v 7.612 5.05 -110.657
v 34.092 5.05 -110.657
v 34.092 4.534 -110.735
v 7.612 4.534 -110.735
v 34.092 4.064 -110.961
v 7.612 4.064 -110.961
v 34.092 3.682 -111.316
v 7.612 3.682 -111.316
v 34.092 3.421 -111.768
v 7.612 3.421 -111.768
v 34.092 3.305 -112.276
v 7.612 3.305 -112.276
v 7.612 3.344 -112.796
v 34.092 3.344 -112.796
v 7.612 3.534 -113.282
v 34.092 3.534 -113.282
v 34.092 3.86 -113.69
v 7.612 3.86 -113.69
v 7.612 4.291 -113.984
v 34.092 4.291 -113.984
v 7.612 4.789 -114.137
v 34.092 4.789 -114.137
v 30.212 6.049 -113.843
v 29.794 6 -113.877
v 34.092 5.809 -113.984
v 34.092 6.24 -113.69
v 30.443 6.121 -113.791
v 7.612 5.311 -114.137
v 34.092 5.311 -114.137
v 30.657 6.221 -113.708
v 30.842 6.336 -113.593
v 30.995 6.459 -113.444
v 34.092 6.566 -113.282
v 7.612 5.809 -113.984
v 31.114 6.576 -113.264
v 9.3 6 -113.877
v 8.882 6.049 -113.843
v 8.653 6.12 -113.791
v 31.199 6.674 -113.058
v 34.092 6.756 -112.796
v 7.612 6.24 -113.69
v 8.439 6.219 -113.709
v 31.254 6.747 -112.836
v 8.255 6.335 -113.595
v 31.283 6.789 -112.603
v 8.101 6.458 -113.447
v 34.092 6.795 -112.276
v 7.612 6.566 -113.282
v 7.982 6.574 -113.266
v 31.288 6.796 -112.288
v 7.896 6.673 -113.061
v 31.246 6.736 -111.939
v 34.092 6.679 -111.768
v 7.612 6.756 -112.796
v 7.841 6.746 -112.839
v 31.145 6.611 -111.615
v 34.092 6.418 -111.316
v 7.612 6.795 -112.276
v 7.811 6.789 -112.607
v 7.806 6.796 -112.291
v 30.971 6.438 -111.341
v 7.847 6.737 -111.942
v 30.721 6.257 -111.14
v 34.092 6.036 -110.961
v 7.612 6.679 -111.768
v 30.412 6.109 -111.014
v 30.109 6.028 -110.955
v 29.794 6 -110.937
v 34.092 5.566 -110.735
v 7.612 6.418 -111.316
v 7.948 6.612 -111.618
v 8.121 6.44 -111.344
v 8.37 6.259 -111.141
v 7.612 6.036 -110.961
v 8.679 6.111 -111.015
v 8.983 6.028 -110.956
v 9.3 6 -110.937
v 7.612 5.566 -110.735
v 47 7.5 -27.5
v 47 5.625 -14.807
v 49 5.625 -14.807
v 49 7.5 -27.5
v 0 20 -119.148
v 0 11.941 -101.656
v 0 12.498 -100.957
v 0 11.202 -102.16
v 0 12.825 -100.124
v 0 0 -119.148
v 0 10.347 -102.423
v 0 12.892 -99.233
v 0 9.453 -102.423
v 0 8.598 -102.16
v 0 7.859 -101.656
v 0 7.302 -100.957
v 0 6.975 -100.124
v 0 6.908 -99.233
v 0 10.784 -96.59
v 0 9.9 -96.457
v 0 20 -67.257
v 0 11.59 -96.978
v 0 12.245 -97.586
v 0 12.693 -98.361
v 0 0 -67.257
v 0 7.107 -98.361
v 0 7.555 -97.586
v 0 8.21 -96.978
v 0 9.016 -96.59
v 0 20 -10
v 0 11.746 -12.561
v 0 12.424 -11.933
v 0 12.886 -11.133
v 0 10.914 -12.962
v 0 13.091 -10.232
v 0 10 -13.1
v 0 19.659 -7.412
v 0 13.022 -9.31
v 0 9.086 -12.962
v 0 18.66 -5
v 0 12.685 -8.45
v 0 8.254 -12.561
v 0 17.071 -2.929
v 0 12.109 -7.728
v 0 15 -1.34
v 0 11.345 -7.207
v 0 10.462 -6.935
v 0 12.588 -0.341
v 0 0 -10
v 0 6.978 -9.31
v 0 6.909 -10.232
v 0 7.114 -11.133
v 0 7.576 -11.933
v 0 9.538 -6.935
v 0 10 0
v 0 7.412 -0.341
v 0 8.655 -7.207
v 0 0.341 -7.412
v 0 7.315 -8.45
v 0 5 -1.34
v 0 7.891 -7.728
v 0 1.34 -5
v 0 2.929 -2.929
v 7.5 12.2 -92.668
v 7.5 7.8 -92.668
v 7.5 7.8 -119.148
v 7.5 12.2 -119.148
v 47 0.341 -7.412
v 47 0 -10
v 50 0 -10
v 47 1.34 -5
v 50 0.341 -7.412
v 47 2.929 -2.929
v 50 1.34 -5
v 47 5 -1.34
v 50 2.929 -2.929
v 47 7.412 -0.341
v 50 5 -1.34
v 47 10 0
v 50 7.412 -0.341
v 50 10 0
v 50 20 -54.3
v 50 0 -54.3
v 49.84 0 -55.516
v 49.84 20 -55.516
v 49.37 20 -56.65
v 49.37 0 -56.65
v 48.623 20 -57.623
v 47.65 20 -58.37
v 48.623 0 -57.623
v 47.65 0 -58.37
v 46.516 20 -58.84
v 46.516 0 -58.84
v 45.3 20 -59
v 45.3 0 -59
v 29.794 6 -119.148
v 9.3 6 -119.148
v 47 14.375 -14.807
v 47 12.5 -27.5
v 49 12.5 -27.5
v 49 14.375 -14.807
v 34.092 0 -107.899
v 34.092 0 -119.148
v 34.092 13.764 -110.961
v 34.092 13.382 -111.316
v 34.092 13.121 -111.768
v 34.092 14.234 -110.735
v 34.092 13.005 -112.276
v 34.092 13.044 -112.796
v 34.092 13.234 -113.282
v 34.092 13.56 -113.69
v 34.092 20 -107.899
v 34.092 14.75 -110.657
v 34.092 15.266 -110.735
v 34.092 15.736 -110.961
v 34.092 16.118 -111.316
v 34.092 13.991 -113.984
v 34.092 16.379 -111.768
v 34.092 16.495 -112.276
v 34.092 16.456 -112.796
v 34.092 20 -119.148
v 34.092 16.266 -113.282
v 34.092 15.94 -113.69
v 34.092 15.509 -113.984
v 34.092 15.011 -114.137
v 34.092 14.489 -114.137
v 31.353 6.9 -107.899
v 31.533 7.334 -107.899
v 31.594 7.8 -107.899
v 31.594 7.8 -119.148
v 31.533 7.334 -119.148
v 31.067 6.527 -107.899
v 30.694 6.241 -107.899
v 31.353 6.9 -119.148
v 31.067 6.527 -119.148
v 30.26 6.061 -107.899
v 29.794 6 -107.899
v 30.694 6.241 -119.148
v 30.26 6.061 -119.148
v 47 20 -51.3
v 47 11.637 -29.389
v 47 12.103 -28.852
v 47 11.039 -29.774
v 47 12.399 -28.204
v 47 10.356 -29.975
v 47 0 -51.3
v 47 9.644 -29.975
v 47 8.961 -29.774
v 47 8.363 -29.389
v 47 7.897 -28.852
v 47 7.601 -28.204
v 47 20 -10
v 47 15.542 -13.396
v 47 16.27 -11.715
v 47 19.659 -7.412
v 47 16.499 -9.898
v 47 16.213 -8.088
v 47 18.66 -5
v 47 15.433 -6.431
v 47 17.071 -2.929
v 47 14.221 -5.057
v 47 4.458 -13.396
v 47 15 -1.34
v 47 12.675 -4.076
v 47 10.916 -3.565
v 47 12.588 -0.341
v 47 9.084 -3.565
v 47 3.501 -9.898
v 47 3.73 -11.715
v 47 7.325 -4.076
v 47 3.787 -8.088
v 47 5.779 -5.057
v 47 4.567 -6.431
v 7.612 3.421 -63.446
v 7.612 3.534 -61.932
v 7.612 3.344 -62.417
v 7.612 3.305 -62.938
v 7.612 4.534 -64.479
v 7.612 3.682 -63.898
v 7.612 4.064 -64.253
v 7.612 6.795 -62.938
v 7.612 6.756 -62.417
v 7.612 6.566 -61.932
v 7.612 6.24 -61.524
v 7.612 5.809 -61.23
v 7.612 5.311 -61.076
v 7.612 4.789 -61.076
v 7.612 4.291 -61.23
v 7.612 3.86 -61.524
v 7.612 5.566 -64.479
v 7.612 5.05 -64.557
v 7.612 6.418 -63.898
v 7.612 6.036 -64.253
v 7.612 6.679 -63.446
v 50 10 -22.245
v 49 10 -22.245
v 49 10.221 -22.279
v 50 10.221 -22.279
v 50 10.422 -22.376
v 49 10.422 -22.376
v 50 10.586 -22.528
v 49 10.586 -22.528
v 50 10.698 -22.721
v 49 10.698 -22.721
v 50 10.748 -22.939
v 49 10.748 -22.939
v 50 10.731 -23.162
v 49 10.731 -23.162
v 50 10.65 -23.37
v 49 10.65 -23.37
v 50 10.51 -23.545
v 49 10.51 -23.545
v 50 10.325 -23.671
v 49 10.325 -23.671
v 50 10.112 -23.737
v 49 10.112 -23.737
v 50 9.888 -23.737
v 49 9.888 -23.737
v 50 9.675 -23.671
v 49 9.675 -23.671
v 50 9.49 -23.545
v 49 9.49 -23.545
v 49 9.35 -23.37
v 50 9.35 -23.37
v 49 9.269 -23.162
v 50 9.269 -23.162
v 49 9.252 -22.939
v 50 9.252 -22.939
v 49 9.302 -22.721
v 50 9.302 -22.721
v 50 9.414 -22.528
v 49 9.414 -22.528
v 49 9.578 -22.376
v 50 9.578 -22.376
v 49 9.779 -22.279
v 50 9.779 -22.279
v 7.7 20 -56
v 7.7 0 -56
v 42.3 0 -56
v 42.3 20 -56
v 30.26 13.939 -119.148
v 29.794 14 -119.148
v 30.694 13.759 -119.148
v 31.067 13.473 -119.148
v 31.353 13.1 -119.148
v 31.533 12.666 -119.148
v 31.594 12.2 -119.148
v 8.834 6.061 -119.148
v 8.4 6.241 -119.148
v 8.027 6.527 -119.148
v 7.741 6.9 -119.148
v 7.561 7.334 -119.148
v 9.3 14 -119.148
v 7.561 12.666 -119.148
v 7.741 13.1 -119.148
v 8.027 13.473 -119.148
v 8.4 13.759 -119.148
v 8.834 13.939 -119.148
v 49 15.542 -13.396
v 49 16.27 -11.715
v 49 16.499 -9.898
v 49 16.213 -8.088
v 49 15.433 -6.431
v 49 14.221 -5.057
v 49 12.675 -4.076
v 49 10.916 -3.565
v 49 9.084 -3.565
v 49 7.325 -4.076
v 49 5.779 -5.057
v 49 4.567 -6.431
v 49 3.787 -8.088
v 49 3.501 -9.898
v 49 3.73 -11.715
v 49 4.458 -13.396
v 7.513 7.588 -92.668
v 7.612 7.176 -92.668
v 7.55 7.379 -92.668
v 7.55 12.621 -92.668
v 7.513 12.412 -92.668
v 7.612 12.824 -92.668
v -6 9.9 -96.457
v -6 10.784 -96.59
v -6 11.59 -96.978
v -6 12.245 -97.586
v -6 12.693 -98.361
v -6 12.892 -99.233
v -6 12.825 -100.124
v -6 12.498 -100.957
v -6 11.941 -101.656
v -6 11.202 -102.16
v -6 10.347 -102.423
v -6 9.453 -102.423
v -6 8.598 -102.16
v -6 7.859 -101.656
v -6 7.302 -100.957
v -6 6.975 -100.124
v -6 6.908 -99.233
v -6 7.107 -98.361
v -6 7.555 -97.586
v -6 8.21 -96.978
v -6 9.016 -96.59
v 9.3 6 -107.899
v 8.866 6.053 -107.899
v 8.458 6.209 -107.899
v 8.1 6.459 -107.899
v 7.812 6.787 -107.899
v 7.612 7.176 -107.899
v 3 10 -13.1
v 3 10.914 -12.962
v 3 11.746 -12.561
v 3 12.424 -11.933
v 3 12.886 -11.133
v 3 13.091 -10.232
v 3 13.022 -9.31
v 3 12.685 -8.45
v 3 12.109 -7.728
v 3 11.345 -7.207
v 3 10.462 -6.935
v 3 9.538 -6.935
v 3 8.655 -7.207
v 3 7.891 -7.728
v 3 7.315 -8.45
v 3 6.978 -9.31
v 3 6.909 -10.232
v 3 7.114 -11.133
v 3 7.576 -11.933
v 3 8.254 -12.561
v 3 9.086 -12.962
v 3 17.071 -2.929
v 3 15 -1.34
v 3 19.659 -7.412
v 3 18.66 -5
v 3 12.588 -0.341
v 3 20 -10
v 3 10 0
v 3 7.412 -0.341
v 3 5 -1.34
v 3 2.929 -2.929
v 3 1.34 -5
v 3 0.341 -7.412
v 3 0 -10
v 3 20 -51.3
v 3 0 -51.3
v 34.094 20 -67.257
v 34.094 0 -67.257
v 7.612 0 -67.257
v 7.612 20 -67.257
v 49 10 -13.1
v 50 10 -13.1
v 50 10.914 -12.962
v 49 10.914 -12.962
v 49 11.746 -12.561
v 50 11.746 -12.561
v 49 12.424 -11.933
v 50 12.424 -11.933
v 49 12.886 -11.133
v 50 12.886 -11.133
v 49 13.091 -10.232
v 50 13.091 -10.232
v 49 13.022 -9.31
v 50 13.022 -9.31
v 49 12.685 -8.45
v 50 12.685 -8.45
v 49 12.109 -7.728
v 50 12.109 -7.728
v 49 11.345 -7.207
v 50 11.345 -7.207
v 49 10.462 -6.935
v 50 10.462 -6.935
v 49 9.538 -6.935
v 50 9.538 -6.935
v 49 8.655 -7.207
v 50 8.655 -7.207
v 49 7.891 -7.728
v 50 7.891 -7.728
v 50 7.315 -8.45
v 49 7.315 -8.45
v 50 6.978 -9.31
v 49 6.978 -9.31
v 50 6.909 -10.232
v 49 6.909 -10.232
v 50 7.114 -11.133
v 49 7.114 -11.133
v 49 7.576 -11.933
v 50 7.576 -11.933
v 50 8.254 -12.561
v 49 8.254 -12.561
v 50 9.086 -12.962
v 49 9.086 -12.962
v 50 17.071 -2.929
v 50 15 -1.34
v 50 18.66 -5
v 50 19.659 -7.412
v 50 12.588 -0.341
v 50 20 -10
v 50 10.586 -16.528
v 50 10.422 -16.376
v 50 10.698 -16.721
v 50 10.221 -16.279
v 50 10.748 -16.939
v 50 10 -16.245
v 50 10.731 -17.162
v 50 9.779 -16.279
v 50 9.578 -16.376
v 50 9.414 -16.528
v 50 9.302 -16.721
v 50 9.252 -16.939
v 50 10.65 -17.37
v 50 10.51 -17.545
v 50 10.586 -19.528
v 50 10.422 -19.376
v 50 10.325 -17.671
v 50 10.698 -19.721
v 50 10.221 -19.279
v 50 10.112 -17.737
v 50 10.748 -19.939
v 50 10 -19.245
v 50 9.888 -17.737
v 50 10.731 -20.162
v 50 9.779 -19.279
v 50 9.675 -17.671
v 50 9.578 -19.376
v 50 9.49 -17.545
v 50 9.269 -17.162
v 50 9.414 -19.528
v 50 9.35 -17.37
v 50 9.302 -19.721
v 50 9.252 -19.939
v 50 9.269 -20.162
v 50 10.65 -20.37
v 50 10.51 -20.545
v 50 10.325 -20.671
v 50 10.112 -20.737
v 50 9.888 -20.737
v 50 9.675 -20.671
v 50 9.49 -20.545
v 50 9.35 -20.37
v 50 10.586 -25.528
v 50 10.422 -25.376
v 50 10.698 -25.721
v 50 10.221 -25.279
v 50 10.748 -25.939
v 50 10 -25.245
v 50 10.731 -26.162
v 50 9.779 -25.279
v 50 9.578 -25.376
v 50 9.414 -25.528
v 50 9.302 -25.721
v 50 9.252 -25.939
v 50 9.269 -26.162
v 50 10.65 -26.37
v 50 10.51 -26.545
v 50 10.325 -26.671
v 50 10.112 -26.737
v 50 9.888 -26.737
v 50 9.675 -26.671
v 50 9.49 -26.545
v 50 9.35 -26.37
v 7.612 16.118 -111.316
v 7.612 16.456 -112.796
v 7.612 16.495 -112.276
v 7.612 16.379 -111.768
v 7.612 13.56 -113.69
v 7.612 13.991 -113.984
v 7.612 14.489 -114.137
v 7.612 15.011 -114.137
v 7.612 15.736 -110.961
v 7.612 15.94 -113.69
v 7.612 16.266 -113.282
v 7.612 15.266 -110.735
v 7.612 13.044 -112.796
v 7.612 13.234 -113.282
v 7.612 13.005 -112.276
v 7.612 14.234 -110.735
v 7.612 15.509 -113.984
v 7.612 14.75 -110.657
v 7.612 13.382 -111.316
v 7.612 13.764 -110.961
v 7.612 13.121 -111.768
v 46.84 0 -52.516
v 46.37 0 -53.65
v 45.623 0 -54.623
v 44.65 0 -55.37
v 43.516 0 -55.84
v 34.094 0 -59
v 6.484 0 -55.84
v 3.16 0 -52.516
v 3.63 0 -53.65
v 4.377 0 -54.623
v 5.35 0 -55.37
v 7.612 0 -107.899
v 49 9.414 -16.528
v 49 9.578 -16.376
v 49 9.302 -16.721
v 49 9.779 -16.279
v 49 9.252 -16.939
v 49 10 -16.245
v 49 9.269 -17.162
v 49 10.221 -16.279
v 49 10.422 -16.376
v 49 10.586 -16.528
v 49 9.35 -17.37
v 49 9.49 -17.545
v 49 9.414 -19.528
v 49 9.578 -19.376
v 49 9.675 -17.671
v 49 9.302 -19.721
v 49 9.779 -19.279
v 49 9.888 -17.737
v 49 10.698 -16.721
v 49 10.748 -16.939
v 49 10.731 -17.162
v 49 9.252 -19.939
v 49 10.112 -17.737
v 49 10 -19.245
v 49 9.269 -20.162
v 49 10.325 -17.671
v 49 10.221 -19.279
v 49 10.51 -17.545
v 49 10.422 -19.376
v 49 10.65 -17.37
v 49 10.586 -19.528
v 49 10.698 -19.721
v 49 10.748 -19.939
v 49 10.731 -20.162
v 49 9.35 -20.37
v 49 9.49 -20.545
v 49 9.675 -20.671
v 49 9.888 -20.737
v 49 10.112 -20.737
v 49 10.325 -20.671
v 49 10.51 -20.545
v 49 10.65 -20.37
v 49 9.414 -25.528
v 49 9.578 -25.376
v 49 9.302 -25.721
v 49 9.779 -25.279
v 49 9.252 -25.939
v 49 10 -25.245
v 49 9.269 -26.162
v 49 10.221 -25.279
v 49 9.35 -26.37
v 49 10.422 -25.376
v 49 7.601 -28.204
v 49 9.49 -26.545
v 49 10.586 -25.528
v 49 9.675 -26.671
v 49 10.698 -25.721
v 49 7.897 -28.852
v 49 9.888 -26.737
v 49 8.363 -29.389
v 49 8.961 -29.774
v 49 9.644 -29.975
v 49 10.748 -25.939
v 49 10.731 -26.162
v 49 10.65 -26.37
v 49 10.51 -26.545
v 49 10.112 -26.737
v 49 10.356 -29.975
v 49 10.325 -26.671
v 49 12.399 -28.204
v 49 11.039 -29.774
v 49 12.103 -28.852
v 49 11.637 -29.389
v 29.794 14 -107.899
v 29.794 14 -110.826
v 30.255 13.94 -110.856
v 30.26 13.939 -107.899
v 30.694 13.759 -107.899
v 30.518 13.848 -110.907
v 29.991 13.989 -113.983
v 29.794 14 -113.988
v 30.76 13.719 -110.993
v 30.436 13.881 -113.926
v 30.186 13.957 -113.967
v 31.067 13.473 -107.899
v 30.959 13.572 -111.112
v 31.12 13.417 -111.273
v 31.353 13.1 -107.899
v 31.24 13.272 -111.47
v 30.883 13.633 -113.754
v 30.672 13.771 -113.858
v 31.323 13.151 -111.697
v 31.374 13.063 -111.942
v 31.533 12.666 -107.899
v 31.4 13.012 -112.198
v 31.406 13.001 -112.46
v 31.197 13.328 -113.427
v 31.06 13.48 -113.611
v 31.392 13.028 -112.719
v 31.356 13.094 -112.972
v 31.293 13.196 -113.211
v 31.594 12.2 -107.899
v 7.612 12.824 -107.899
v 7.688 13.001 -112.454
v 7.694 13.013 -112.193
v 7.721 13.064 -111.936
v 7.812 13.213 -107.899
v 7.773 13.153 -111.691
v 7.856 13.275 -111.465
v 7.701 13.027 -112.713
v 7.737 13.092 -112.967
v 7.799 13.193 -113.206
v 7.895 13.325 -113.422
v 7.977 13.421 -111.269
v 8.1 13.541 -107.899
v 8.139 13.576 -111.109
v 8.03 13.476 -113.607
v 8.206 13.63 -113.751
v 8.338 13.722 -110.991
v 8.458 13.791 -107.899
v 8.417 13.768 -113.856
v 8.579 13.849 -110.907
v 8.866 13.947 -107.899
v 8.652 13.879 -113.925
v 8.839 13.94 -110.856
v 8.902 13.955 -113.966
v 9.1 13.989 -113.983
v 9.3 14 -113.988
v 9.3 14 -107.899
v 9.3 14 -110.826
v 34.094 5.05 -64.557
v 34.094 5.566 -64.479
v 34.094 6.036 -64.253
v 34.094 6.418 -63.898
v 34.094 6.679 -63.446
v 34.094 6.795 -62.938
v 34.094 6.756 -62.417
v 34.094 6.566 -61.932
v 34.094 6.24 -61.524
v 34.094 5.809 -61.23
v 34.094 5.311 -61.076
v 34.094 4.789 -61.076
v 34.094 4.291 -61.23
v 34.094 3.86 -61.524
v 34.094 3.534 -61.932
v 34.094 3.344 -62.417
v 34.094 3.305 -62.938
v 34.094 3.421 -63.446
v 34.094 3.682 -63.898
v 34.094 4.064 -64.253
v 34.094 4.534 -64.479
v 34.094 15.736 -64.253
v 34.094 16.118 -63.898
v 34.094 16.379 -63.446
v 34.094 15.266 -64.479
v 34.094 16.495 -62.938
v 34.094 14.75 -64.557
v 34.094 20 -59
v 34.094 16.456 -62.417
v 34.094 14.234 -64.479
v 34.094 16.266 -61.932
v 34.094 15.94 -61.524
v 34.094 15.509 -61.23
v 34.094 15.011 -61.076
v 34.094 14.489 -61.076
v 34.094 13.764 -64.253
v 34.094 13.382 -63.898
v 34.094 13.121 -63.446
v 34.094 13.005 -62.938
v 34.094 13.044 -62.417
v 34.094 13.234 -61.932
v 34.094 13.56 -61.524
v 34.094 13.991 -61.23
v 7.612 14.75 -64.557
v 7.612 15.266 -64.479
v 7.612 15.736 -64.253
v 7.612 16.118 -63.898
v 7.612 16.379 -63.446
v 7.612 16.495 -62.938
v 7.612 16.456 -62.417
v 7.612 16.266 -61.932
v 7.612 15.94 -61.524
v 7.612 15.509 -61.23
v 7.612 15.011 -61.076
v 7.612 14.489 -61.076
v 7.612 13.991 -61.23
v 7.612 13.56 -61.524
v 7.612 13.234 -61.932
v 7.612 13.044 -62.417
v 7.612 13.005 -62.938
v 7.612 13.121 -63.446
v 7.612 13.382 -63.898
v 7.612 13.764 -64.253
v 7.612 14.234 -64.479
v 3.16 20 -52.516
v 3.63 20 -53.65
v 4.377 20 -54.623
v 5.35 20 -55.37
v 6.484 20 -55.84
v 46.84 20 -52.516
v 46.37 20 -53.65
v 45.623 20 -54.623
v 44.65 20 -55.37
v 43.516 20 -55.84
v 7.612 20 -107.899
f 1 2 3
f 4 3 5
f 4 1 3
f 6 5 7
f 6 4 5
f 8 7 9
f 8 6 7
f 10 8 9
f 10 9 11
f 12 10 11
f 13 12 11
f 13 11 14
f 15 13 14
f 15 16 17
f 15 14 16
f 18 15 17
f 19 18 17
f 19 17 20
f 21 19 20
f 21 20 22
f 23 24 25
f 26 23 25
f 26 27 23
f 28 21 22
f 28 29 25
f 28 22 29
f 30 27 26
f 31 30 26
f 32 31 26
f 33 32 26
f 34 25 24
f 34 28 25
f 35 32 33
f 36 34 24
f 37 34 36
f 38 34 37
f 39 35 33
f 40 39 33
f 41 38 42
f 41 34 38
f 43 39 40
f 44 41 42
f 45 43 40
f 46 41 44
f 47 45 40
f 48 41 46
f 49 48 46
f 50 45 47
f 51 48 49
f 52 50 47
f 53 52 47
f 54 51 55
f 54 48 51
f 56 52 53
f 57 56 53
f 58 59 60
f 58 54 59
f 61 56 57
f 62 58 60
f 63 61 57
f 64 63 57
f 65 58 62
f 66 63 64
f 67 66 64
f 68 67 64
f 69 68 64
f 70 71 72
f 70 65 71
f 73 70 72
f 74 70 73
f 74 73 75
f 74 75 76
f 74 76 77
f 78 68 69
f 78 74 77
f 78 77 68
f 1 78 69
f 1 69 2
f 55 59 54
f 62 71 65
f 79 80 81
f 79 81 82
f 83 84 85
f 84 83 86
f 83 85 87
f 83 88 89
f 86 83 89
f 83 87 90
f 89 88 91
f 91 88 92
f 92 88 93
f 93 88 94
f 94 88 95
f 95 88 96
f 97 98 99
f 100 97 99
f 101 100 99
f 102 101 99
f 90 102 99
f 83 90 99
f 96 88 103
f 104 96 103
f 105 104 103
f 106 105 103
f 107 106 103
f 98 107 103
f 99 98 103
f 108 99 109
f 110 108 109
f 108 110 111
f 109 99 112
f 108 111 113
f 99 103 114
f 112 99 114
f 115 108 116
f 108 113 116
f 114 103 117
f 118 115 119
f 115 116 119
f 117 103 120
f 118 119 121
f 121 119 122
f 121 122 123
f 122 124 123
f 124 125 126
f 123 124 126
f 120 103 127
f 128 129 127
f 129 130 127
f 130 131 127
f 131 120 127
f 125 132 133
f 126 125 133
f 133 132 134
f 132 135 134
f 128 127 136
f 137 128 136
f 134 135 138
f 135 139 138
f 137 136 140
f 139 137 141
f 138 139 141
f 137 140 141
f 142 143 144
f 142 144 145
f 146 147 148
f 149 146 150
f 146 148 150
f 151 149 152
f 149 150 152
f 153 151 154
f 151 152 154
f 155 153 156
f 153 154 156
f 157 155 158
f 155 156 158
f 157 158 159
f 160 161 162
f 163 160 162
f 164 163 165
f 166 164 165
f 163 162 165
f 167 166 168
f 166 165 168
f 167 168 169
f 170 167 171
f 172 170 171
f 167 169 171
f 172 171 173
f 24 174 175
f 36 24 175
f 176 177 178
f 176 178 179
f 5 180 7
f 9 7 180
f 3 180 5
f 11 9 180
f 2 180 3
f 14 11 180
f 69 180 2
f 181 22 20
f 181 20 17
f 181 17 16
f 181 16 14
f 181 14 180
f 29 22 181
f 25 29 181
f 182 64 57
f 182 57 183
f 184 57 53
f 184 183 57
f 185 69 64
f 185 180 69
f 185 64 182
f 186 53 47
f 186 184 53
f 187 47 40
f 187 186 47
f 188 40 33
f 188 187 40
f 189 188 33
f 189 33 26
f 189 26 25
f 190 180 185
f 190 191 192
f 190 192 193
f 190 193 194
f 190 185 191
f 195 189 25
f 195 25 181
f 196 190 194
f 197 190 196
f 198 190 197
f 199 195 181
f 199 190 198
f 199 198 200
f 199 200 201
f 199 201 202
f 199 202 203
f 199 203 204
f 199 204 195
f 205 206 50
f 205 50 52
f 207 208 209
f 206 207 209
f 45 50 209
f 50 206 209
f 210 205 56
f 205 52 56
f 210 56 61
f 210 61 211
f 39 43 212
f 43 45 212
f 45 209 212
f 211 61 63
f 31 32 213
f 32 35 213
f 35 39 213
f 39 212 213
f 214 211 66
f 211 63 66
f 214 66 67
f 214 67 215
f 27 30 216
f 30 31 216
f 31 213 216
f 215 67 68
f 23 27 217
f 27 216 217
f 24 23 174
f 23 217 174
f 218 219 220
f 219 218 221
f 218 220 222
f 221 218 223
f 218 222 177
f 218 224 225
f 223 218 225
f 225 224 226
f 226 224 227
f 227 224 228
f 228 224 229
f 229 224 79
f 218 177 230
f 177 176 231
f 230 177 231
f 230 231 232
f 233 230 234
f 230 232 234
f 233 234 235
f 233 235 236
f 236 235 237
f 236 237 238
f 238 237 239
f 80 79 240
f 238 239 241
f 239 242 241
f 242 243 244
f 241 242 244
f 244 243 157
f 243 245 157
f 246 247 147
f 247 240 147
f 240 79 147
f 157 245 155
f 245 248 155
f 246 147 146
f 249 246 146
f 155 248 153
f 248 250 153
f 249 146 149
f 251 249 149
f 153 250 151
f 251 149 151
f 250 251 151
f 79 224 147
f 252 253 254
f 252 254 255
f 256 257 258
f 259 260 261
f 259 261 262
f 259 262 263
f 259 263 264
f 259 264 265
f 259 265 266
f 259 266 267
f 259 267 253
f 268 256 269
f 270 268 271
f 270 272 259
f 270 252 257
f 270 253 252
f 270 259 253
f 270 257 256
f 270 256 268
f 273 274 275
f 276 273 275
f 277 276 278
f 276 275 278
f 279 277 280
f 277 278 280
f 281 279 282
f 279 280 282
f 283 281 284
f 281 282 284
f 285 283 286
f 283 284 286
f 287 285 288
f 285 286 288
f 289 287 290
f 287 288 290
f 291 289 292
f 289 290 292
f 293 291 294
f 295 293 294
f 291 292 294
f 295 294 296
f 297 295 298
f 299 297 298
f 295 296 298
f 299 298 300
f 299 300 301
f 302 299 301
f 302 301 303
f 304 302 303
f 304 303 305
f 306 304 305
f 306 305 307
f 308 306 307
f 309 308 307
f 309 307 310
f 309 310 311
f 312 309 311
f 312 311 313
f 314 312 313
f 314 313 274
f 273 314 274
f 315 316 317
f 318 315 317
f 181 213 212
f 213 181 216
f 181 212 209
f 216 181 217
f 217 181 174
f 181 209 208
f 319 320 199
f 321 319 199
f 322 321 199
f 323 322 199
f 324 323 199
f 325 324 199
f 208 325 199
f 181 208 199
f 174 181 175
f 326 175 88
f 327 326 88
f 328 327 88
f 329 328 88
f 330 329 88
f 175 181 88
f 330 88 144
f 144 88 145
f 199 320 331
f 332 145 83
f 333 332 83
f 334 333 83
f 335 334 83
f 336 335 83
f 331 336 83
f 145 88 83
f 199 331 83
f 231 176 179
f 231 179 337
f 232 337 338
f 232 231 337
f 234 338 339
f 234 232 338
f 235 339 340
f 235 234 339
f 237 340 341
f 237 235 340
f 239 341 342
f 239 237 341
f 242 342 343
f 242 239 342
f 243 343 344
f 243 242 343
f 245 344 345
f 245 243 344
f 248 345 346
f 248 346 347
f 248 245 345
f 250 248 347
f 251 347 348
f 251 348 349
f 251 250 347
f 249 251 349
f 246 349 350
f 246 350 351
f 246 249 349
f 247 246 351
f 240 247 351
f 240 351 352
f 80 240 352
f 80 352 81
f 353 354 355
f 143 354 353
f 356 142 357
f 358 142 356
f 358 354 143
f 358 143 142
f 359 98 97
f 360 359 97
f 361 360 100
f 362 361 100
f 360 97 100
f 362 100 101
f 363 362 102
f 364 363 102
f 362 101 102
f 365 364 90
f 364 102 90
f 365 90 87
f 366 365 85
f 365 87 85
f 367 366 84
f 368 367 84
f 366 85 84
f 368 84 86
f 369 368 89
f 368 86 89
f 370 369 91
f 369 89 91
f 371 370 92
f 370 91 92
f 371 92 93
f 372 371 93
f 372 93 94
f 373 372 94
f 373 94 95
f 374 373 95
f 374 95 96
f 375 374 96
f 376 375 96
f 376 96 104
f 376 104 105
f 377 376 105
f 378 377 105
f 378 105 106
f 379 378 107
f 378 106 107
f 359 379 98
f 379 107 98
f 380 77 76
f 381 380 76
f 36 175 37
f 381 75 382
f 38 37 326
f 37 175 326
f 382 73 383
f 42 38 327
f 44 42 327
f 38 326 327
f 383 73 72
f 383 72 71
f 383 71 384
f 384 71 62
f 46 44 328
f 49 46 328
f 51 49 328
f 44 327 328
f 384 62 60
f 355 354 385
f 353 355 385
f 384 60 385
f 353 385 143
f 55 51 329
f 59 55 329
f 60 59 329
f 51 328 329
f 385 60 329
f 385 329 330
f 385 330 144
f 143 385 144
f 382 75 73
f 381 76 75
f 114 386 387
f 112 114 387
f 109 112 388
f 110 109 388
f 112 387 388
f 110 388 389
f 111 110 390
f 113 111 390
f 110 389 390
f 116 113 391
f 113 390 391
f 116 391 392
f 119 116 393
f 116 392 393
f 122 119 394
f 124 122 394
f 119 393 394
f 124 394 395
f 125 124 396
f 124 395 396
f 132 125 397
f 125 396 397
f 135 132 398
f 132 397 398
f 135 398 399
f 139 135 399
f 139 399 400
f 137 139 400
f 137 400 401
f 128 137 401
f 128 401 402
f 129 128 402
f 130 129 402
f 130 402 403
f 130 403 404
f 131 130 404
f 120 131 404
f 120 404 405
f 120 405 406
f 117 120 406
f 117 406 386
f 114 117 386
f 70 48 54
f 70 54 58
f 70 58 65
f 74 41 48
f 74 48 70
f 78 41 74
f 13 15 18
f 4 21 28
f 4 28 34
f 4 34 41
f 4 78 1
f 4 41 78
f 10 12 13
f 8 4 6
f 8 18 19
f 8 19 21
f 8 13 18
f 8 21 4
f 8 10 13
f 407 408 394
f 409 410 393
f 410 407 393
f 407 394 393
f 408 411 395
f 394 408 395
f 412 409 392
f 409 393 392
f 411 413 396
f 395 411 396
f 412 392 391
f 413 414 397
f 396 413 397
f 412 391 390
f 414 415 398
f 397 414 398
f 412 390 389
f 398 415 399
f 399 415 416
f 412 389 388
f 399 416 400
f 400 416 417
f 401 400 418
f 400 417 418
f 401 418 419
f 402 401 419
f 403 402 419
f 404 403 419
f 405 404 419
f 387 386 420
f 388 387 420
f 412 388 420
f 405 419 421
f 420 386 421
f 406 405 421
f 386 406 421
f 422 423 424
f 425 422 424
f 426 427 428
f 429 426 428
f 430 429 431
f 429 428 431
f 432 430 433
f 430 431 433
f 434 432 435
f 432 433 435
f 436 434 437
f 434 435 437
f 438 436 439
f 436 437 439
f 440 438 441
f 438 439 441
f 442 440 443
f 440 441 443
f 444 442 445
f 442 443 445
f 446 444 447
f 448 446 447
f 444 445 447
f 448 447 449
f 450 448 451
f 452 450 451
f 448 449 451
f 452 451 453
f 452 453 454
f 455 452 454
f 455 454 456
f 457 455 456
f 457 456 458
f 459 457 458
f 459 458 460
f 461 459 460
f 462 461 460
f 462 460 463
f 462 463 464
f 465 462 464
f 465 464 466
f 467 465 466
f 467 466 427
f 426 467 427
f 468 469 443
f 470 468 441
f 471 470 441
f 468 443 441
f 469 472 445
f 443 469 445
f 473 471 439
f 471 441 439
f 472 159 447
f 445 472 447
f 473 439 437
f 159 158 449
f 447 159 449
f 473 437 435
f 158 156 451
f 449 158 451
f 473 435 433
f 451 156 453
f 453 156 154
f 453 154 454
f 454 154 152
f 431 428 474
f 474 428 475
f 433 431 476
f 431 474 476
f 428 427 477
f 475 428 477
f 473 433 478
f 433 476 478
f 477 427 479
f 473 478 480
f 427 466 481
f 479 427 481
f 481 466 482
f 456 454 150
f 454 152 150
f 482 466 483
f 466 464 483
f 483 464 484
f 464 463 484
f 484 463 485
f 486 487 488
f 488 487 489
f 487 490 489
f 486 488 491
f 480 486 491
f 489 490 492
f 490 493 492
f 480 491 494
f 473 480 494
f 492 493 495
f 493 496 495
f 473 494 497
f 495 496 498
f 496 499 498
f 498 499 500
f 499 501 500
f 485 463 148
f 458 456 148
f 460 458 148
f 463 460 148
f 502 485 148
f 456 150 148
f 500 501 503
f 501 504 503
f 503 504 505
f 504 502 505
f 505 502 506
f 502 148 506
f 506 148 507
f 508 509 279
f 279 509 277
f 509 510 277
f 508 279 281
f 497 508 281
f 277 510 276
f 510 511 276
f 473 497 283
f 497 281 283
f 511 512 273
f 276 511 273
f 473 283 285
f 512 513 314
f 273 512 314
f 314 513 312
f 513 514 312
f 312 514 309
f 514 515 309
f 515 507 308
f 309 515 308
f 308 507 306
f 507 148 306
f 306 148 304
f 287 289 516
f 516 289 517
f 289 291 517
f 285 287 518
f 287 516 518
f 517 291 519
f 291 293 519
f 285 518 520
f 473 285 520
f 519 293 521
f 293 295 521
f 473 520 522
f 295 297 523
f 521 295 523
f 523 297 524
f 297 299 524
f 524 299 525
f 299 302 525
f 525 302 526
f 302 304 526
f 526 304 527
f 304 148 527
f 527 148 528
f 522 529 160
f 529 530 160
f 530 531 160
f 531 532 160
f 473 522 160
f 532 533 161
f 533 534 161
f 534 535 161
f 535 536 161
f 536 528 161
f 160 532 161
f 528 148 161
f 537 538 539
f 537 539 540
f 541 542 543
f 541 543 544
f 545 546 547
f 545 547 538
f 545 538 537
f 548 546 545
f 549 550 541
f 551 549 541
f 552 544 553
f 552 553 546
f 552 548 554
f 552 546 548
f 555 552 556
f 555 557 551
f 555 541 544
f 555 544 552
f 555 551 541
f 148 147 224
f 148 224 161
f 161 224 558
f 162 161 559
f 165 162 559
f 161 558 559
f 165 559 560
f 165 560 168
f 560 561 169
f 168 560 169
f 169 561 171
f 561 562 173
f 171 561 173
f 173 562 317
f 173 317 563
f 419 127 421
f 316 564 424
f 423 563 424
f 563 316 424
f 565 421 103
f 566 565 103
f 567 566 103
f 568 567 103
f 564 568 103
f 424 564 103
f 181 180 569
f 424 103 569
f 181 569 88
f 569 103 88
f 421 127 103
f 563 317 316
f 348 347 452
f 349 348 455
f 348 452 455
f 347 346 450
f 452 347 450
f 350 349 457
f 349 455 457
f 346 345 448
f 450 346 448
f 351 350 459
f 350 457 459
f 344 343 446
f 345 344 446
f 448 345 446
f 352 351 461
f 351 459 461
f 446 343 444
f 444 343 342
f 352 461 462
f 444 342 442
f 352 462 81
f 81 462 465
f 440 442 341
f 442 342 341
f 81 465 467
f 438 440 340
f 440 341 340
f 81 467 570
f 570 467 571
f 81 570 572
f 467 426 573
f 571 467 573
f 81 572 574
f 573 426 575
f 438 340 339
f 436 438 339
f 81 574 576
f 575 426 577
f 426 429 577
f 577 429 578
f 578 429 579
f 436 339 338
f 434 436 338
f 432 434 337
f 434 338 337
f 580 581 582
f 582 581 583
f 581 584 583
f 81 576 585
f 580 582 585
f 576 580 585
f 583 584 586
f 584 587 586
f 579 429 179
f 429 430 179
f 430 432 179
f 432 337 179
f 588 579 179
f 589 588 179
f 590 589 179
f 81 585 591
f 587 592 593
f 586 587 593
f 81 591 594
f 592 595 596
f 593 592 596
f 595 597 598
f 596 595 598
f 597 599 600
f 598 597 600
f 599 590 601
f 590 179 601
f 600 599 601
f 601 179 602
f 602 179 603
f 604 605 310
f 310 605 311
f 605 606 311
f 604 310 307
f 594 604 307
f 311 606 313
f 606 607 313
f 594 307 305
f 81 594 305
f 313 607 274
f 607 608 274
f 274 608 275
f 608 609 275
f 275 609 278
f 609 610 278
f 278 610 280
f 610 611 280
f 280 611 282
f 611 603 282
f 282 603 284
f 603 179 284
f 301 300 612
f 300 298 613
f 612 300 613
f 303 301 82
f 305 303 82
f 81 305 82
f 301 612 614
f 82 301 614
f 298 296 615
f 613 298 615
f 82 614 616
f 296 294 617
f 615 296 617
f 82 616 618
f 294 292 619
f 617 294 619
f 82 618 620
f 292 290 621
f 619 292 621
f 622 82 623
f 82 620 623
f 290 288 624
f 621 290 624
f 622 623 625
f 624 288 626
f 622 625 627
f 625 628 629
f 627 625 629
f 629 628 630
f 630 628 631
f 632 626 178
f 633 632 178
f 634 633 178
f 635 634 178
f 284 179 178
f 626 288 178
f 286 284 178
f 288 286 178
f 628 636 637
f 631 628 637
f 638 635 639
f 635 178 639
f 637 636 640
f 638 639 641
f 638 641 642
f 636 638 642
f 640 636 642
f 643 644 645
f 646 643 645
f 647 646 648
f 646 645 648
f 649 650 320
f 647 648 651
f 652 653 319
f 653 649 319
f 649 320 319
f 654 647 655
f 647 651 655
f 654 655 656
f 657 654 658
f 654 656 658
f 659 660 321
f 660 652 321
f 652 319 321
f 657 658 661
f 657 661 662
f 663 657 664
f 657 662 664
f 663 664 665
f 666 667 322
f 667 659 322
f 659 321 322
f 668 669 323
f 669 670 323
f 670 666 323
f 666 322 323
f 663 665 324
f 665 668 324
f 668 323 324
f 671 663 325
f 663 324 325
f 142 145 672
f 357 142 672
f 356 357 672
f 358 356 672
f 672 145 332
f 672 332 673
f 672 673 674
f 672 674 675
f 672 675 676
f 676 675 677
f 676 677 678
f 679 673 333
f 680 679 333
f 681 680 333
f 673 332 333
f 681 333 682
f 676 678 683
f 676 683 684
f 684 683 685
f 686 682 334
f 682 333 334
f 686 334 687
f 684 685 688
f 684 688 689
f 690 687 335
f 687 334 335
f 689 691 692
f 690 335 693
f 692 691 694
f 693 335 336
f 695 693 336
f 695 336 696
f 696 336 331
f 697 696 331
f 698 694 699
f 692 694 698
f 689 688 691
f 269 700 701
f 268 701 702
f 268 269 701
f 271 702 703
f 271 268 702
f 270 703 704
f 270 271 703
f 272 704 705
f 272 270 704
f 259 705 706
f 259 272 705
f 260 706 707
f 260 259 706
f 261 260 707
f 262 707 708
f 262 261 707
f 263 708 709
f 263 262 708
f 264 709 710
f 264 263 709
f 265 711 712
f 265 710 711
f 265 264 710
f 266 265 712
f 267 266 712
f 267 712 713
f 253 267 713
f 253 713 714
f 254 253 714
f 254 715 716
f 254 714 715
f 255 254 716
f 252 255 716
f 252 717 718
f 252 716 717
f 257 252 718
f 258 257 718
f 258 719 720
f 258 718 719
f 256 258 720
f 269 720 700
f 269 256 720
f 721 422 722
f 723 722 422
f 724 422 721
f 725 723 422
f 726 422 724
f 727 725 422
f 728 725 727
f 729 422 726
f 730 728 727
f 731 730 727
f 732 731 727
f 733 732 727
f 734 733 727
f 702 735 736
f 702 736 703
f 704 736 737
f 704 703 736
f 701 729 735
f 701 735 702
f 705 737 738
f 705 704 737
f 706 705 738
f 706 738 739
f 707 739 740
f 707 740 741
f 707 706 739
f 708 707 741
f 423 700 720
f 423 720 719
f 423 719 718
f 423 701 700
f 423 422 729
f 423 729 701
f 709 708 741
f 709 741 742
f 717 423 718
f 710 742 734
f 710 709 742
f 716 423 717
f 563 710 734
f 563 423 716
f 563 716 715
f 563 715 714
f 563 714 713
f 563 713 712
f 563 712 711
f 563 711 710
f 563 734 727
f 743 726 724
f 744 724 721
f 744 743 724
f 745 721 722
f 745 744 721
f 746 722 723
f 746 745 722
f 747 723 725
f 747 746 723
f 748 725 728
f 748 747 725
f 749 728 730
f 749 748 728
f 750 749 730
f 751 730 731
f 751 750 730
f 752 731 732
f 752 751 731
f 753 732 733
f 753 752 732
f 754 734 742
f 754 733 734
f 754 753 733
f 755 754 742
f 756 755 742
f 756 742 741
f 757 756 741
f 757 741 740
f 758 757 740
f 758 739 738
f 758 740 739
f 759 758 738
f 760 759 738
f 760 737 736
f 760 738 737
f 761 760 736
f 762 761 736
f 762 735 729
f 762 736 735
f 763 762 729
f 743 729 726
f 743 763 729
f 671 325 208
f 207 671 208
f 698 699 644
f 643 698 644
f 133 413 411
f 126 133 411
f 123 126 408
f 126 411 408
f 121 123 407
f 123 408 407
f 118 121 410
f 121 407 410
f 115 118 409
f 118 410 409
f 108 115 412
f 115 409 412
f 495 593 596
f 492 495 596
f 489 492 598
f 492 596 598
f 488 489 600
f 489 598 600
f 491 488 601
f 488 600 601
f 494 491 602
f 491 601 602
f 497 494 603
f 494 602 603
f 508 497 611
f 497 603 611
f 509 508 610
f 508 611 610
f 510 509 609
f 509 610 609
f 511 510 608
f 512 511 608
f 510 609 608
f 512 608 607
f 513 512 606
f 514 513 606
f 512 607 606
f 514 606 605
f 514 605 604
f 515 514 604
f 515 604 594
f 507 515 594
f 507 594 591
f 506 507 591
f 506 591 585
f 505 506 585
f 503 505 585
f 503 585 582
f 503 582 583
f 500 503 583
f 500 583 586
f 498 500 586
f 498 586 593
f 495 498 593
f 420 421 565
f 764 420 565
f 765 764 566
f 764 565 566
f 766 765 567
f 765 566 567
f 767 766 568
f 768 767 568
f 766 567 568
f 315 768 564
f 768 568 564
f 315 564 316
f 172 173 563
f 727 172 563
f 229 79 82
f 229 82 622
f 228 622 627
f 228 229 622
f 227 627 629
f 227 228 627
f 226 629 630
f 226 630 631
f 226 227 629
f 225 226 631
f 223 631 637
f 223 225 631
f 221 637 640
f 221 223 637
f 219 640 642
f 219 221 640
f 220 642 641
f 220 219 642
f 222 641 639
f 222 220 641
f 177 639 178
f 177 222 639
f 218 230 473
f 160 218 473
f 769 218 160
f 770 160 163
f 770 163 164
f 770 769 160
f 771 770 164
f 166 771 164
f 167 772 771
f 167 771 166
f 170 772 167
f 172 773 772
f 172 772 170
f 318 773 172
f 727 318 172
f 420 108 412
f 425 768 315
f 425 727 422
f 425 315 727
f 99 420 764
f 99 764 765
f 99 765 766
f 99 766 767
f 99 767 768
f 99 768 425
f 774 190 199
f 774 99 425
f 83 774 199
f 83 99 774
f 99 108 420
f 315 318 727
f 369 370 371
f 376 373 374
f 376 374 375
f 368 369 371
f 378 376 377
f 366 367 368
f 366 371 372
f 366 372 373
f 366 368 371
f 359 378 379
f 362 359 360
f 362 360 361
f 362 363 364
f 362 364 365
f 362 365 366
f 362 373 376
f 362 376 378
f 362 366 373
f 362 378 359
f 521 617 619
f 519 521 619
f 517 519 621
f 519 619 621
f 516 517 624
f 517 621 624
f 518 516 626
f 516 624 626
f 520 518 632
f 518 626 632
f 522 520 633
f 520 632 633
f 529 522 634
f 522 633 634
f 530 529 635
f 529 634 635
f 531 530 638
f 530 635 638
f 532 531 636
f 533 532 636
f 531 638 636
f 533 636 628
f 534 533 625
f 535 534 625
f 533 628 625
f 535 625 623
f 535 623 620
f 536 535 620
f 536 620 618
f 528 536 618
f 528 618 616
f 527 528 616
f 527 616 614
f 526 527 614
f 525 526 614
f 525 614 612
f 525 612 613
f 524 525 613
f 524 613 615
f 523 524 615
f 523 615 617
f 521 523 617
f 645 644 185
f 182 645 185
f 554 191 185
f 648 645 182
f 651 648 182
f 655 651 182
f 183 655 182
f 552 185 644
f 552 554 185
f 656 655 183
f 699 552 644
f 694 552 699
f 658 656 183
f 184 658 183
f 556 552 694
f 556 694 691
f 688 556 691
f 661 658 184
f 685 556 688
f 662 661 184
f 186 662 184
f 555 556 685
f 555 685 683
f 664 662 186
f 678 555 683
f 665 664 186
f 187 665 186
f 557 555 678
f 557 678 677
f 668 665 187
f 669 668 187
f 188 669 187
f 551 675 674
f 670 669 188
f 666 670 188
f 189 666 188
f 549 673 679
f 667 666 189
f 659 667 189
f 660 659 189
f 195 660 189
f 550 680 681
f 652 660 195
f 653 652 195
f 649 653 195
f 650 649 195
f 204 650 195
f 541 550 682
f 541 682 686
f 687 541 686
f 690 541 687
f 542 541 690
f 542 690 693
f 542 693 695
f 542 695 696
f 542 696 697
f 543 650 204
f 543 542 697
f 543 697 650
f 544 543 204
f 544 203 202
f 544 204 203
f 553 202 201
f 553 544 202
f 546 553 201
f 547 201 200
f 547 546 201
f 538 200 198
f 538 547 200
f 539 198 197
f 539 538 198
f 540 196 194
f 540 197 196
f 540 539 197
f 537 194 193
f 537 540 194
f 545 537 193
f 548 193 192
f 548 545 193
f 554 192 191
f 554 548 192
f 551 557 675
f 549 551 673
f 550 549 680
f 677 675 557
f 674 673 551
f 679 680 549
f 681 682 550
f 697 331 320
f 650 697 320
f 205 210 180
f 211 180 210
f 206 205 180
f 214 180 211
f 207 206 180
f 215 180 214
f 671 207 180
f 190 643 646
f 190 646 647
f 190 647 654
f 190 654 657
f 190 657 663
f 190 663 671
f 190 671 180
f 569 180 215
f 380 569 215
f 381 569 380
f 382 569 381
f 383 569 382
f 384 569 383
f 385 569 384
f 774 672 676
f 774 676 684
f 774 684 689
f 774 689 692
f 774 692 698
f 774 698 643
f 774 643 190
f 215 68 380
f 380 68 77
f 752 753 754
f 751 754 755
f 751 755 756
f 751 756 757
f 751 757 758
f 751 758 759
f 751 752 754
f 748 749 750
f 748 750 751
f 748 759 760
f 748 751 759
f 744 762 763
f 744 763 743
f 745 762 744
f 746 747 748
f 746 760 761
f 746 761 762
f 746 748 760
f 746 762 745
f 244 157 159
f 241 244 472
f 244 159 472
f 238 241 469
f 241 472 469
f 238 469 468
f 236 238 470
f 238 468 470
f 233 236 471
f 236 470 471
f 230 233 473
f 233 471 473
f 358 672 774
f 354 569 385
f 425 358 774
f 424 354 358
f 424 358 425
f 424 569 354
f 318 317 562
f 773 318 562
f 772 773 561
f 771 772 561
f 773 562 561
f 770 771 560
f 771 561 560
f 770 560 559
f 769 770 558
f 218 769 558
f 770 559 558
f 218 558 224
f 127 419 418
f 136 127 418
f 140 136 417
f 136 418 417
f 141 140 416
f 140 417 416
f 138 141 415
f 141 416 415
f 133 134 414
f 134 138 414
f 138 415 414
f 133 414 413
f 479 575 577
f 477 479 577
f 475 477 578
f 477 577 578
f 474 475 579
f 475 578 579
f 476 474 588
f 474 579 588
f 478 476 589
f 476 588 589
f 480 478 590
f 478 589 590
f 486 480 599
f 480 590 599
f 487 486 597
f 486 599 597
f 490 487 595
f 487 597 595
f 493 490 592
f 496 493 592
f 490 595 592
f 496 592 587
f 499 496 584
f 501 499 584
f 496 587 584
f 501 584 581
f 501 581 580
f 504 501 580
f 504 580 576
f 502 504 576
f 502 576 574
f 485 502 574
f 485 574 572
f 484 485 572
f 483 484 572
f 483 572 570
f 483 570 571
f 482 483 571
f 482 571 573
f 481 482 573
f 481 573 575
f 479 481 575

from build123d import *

# Parameters (mm, degrees)
AUFSATZ_LINEAR_AUSTRAGEN1_DEPTH      = 20
SCHNITT_LINEAR_AUSTRAGEN1_DEPTH      = 53.24
SKIZZE3_R                            = 3.1
SCHNITT_LINEAR_AUSTRAGEN2_DEPTH      = 53.24
SCHNITT_LINEAR_AUSTRAGEN3_DEPTH      = 2
SKIZZE5_R                            = 0.75
SCHNITT_LINEAR_AUSTRAGEN4_DEPTH      = 2
AUFSATZ_LINEAR_AUSTRAGEN2_DEPTH      = 20
SKIZZE7_W                            = 7.611739691
SKIZZE7_H                            = 51.890970688
AUFSATZ_LINEAR_AUSTRAGEN3_DEPTH      = 20
SKIZZE8_W                            = 11.248625368
SKIZZE8_H                            = 20
AUFSATZ_LINEAR_AUSTRAGEN4_DEPTH      = 26.48
SCHNITT_LINEAR_AUSTRAGEN5_DEPTH      = 26.48
SCHNITT_LINEAR_AUSTRAGEN6_DEPTH      = 6
SCHNITT_LINEAR_AUSTRAGEN6_DEPTH_BACK = 26.48
SKIZZE10_R                           = 1.75
SKIZZE11_R                           = 3
AUFSATZ_LINEAR_AUSTRAGEN5_DEPTH      = 6


with BuildPart() as part:
    # Skizze1 → Aufsatz-Linear austragen1 (new body)
    with BuildSketch(Plane(origin=(0, 0, 0), x_dir=(1, 0, 0), z_dir=(0, 1, 0))):
        with BuildLine():
            Line((0, 59), (0, 0))
            Line((0, 0), (3, 0))
            Line((3, 0), (3, 51.3))
            ThreePointArc((3, 51.3), (4.376598128, 54.623401872), (7.7, 56))
            Line((7.7, 56), (42.3, 56))
            ThreePointArc((42.3, 56), (45.623401872, 54.623401872), (47, 51.3))
            Line((47, 51.3), (47, 0))
            Line((47, 0), (50, 0))
            Line((50, 0), (50, 54.3))
            ThreePointArc((50, 54.3), (48.623401872, 57.623401872), (45.3, 59))
            Line((45.3, 59), (0, 59))
        make_face()
    extrude(amount=AUFSATZ_LINEAR_AUSTRAGEN1_DEPTH)

    # Skizze2 → Schnitt-Linear austragen1 (cut)
    with BuildSketch(Plane(origin=(50, 0, 0), x_dir=(0, 0, -1), z_dir=(1, 0, 0))):
        with BuildLine():
            ThreePointArc((0, 10), (2.928932188, 17.071067812), (10, 20))
            Line((10, 20), (0, 20))
            Line((0, 20), (0, 10))
        make_face()
        with BuildLine():
            ThreePointArc((10, 0), (2.928932188, 2.928932188), (0, 10))
            Line((0, 10), (0, 0))
            Line((0, 0), (10, 0))
        make_face()
    extrude(amount=-SCHNITT_LINEAR_AUSTRAGEN1_DEPTH, mode=Mode.SUBTRACT)

    # Skizze3 → Schnitt-Linear austragen2 (cut)
    with BuildSketch(Plane(origin=(50, 0, 0), x_dir=(0, 0, -1), z_dir=(1, 0, 0))):
        with Locations((10, 10)):
            Circle(SKIZZE3_R)
    extrude(amount=-SCHNITT_LINEAR_AUSTRAGEN2_DEPTH, mode=Mode.SUBTRACT)

    # Skizze4 → Schnitt-Linear austragen3 (cut)
    with BuildSketch(Plane.ZY.offset(-47)):
        with BuildLine():
            Line((-27.5, 12.5), (-14.807252725, 14.374965285))
            ThreePointArc((-14.807252725, 14.374965285), (-3.5, 10), (-14.807252725, 5.625034715))
            Line((-14.807252725, 5.625034715), (-27.5, 7.5))
            ThreePointArc((-27.5, 7.5), (-30, 10), (-27.5, 12.5))
        make_face()
    extrude(amount=-SCHNITT_LINEAR_AUSTRAGEN3_DEPTH, mode=Mode.SUBTRACT)

    # Skizze5 → Schnitt-Linear austragen4 (cut)
    with BuildSketch(Plane.ZY.offset(-49)):
        with Locations((-25.995480757, 10)):
            Circle(SKIZZE5_R)
        with Locations((-22.995480757, 10)):
            Circle(SKIZZE5_R)
        with Locations((-19.995480757, 10)):
            Circle(SKIZZE5_R)
        with Locations((-16.995480757, 10)):
            Circle(SKIZZE5_R)
    extrude(amount=-SCHNITT_LINEAR_AUSTRAGEN4_DEPTH, mode=Mode.SUBTRACT)

    # Skizze6 → Aufsatz-Linear austragen2 (add)
    with BuildSketch(Plane.XZ):
        Polygon((34.094038703, -59.256850744), (34.094038703, -67.256850744), (0, -67.256850744), (0, -59.256850744), (0, -57.894447073), (34.094038703, -57.894447073), align=None)
    extrude(amount=-AUFSATZ_LINEAR_AUSTRAGEN2_DEPTH)

    # Skizze7 → Aufsatz-Linear austragen3 (add)
    with BuildSketch(Plane.XZ):
        with Locations((3.805869846, -93.202336088)):
            Rectangle(SKIZZE7_W, SKIZZE7_H)
    extrude(amount=-AUFSATZ_LINEAR_AUSTRAGEN3_DEPTH)

    # Skizze8 → Aufsatz-Linear austragen4 (add)
    with BuildSketch(Plane(origin=(7.611739691, 0, 0), x_dir=(0, 0, -1), z_dir=(1, 0, 0))):
        with Locations((113.523508748, 10)):
            Rectangle(SKIZZE8_W, SKIZZE8_H)
    extrude(amount=AUFSATZ_LINEAR_AUSTRAGEN4_DEPTH)

    # Skizze9 → Schnitt-Linear austragen5 (cut)
    with BuildSketch(Plane(origin=(0, 0, -119.147821432), x_dir=(-1, 0, 0), z_dir=(0, 0, -1))):
        with BuildLine():
            Line((-9.3, 14), (-29.794038703, 14))
            ThreePointArc((-29.794038703, 14), (-31.066830909, 13.472792206), (-31.594038703, 12.2))
            Line((-31.594038703, 12.2), (-31.594038703, 7.8))
            ThreePointArc((-31.594038703, 7.8), (-31.066830909, 6.527207794), (-29.794038703, 6))
            Line((-29.794038703, 6), (-9.3, 6))
            ThreePointArc((-9.3, 6), (-8.027207794, 6.527207794), (-7.5, 7.8))
            Line((-7.5, 7.8), (-7.5, 12.2))
            ThreePointArc((-7.5, 12.2), (-8.027207794, 13.472792206), (-9.3, 14))
        make_face()
    extrude(amount=-SCHNITT_LINEAR_AUSTRAGEN5_DEPTH, mode=Mode.SUBTRACT)

    # Skizze10 → Schnitt-Linear austragen6 (cut, two sides: drawn at the far end of the back side and taken through both)
    with BuildSketch(Plane(origin=(34.091739691, 0, 0), x_dir=(0, 0, -1), z_dir=(1, 0, 0)).offset(-SCHNITT_LINEAR_AUSTRAGEN6_DEPTH_BACK)):
        with Locations((62.806850744, 14.75)):
            Circle(SKIZZE10_R)
        with Locations((62.806850744, 5.05)):
            Circle(SKIZZE10_R)
        with Locations(Location((112.406850744, 5.05, 0), (0, 0, 180))):
            Circle(SKIZZE10_R)
        with Locations(Location((112.406850744, 14.75, 0), (0, 0, 180))):
            Circle(SKIZZE10_R)
    extrude(amount=SCHNITT_LINEAR_AUSTRAGEN6_DEPTH + SCHNITT_LINEAR_AUSTRAGEN6_DEPTH_BACK, mode=Mode.SUBTRACT)

    # Skizze11 → Aufsatz-Linear austragen5 (add)
    with BuildSketch(Plane.ZY):
        with Locations((-99.456850744, 9.9)):
            Circle(SKIZZE11_R)
    extrude(amount=AUFSATZ_LINEAR_AUSTRAGEN5_DEPTH)


solid = part.part
